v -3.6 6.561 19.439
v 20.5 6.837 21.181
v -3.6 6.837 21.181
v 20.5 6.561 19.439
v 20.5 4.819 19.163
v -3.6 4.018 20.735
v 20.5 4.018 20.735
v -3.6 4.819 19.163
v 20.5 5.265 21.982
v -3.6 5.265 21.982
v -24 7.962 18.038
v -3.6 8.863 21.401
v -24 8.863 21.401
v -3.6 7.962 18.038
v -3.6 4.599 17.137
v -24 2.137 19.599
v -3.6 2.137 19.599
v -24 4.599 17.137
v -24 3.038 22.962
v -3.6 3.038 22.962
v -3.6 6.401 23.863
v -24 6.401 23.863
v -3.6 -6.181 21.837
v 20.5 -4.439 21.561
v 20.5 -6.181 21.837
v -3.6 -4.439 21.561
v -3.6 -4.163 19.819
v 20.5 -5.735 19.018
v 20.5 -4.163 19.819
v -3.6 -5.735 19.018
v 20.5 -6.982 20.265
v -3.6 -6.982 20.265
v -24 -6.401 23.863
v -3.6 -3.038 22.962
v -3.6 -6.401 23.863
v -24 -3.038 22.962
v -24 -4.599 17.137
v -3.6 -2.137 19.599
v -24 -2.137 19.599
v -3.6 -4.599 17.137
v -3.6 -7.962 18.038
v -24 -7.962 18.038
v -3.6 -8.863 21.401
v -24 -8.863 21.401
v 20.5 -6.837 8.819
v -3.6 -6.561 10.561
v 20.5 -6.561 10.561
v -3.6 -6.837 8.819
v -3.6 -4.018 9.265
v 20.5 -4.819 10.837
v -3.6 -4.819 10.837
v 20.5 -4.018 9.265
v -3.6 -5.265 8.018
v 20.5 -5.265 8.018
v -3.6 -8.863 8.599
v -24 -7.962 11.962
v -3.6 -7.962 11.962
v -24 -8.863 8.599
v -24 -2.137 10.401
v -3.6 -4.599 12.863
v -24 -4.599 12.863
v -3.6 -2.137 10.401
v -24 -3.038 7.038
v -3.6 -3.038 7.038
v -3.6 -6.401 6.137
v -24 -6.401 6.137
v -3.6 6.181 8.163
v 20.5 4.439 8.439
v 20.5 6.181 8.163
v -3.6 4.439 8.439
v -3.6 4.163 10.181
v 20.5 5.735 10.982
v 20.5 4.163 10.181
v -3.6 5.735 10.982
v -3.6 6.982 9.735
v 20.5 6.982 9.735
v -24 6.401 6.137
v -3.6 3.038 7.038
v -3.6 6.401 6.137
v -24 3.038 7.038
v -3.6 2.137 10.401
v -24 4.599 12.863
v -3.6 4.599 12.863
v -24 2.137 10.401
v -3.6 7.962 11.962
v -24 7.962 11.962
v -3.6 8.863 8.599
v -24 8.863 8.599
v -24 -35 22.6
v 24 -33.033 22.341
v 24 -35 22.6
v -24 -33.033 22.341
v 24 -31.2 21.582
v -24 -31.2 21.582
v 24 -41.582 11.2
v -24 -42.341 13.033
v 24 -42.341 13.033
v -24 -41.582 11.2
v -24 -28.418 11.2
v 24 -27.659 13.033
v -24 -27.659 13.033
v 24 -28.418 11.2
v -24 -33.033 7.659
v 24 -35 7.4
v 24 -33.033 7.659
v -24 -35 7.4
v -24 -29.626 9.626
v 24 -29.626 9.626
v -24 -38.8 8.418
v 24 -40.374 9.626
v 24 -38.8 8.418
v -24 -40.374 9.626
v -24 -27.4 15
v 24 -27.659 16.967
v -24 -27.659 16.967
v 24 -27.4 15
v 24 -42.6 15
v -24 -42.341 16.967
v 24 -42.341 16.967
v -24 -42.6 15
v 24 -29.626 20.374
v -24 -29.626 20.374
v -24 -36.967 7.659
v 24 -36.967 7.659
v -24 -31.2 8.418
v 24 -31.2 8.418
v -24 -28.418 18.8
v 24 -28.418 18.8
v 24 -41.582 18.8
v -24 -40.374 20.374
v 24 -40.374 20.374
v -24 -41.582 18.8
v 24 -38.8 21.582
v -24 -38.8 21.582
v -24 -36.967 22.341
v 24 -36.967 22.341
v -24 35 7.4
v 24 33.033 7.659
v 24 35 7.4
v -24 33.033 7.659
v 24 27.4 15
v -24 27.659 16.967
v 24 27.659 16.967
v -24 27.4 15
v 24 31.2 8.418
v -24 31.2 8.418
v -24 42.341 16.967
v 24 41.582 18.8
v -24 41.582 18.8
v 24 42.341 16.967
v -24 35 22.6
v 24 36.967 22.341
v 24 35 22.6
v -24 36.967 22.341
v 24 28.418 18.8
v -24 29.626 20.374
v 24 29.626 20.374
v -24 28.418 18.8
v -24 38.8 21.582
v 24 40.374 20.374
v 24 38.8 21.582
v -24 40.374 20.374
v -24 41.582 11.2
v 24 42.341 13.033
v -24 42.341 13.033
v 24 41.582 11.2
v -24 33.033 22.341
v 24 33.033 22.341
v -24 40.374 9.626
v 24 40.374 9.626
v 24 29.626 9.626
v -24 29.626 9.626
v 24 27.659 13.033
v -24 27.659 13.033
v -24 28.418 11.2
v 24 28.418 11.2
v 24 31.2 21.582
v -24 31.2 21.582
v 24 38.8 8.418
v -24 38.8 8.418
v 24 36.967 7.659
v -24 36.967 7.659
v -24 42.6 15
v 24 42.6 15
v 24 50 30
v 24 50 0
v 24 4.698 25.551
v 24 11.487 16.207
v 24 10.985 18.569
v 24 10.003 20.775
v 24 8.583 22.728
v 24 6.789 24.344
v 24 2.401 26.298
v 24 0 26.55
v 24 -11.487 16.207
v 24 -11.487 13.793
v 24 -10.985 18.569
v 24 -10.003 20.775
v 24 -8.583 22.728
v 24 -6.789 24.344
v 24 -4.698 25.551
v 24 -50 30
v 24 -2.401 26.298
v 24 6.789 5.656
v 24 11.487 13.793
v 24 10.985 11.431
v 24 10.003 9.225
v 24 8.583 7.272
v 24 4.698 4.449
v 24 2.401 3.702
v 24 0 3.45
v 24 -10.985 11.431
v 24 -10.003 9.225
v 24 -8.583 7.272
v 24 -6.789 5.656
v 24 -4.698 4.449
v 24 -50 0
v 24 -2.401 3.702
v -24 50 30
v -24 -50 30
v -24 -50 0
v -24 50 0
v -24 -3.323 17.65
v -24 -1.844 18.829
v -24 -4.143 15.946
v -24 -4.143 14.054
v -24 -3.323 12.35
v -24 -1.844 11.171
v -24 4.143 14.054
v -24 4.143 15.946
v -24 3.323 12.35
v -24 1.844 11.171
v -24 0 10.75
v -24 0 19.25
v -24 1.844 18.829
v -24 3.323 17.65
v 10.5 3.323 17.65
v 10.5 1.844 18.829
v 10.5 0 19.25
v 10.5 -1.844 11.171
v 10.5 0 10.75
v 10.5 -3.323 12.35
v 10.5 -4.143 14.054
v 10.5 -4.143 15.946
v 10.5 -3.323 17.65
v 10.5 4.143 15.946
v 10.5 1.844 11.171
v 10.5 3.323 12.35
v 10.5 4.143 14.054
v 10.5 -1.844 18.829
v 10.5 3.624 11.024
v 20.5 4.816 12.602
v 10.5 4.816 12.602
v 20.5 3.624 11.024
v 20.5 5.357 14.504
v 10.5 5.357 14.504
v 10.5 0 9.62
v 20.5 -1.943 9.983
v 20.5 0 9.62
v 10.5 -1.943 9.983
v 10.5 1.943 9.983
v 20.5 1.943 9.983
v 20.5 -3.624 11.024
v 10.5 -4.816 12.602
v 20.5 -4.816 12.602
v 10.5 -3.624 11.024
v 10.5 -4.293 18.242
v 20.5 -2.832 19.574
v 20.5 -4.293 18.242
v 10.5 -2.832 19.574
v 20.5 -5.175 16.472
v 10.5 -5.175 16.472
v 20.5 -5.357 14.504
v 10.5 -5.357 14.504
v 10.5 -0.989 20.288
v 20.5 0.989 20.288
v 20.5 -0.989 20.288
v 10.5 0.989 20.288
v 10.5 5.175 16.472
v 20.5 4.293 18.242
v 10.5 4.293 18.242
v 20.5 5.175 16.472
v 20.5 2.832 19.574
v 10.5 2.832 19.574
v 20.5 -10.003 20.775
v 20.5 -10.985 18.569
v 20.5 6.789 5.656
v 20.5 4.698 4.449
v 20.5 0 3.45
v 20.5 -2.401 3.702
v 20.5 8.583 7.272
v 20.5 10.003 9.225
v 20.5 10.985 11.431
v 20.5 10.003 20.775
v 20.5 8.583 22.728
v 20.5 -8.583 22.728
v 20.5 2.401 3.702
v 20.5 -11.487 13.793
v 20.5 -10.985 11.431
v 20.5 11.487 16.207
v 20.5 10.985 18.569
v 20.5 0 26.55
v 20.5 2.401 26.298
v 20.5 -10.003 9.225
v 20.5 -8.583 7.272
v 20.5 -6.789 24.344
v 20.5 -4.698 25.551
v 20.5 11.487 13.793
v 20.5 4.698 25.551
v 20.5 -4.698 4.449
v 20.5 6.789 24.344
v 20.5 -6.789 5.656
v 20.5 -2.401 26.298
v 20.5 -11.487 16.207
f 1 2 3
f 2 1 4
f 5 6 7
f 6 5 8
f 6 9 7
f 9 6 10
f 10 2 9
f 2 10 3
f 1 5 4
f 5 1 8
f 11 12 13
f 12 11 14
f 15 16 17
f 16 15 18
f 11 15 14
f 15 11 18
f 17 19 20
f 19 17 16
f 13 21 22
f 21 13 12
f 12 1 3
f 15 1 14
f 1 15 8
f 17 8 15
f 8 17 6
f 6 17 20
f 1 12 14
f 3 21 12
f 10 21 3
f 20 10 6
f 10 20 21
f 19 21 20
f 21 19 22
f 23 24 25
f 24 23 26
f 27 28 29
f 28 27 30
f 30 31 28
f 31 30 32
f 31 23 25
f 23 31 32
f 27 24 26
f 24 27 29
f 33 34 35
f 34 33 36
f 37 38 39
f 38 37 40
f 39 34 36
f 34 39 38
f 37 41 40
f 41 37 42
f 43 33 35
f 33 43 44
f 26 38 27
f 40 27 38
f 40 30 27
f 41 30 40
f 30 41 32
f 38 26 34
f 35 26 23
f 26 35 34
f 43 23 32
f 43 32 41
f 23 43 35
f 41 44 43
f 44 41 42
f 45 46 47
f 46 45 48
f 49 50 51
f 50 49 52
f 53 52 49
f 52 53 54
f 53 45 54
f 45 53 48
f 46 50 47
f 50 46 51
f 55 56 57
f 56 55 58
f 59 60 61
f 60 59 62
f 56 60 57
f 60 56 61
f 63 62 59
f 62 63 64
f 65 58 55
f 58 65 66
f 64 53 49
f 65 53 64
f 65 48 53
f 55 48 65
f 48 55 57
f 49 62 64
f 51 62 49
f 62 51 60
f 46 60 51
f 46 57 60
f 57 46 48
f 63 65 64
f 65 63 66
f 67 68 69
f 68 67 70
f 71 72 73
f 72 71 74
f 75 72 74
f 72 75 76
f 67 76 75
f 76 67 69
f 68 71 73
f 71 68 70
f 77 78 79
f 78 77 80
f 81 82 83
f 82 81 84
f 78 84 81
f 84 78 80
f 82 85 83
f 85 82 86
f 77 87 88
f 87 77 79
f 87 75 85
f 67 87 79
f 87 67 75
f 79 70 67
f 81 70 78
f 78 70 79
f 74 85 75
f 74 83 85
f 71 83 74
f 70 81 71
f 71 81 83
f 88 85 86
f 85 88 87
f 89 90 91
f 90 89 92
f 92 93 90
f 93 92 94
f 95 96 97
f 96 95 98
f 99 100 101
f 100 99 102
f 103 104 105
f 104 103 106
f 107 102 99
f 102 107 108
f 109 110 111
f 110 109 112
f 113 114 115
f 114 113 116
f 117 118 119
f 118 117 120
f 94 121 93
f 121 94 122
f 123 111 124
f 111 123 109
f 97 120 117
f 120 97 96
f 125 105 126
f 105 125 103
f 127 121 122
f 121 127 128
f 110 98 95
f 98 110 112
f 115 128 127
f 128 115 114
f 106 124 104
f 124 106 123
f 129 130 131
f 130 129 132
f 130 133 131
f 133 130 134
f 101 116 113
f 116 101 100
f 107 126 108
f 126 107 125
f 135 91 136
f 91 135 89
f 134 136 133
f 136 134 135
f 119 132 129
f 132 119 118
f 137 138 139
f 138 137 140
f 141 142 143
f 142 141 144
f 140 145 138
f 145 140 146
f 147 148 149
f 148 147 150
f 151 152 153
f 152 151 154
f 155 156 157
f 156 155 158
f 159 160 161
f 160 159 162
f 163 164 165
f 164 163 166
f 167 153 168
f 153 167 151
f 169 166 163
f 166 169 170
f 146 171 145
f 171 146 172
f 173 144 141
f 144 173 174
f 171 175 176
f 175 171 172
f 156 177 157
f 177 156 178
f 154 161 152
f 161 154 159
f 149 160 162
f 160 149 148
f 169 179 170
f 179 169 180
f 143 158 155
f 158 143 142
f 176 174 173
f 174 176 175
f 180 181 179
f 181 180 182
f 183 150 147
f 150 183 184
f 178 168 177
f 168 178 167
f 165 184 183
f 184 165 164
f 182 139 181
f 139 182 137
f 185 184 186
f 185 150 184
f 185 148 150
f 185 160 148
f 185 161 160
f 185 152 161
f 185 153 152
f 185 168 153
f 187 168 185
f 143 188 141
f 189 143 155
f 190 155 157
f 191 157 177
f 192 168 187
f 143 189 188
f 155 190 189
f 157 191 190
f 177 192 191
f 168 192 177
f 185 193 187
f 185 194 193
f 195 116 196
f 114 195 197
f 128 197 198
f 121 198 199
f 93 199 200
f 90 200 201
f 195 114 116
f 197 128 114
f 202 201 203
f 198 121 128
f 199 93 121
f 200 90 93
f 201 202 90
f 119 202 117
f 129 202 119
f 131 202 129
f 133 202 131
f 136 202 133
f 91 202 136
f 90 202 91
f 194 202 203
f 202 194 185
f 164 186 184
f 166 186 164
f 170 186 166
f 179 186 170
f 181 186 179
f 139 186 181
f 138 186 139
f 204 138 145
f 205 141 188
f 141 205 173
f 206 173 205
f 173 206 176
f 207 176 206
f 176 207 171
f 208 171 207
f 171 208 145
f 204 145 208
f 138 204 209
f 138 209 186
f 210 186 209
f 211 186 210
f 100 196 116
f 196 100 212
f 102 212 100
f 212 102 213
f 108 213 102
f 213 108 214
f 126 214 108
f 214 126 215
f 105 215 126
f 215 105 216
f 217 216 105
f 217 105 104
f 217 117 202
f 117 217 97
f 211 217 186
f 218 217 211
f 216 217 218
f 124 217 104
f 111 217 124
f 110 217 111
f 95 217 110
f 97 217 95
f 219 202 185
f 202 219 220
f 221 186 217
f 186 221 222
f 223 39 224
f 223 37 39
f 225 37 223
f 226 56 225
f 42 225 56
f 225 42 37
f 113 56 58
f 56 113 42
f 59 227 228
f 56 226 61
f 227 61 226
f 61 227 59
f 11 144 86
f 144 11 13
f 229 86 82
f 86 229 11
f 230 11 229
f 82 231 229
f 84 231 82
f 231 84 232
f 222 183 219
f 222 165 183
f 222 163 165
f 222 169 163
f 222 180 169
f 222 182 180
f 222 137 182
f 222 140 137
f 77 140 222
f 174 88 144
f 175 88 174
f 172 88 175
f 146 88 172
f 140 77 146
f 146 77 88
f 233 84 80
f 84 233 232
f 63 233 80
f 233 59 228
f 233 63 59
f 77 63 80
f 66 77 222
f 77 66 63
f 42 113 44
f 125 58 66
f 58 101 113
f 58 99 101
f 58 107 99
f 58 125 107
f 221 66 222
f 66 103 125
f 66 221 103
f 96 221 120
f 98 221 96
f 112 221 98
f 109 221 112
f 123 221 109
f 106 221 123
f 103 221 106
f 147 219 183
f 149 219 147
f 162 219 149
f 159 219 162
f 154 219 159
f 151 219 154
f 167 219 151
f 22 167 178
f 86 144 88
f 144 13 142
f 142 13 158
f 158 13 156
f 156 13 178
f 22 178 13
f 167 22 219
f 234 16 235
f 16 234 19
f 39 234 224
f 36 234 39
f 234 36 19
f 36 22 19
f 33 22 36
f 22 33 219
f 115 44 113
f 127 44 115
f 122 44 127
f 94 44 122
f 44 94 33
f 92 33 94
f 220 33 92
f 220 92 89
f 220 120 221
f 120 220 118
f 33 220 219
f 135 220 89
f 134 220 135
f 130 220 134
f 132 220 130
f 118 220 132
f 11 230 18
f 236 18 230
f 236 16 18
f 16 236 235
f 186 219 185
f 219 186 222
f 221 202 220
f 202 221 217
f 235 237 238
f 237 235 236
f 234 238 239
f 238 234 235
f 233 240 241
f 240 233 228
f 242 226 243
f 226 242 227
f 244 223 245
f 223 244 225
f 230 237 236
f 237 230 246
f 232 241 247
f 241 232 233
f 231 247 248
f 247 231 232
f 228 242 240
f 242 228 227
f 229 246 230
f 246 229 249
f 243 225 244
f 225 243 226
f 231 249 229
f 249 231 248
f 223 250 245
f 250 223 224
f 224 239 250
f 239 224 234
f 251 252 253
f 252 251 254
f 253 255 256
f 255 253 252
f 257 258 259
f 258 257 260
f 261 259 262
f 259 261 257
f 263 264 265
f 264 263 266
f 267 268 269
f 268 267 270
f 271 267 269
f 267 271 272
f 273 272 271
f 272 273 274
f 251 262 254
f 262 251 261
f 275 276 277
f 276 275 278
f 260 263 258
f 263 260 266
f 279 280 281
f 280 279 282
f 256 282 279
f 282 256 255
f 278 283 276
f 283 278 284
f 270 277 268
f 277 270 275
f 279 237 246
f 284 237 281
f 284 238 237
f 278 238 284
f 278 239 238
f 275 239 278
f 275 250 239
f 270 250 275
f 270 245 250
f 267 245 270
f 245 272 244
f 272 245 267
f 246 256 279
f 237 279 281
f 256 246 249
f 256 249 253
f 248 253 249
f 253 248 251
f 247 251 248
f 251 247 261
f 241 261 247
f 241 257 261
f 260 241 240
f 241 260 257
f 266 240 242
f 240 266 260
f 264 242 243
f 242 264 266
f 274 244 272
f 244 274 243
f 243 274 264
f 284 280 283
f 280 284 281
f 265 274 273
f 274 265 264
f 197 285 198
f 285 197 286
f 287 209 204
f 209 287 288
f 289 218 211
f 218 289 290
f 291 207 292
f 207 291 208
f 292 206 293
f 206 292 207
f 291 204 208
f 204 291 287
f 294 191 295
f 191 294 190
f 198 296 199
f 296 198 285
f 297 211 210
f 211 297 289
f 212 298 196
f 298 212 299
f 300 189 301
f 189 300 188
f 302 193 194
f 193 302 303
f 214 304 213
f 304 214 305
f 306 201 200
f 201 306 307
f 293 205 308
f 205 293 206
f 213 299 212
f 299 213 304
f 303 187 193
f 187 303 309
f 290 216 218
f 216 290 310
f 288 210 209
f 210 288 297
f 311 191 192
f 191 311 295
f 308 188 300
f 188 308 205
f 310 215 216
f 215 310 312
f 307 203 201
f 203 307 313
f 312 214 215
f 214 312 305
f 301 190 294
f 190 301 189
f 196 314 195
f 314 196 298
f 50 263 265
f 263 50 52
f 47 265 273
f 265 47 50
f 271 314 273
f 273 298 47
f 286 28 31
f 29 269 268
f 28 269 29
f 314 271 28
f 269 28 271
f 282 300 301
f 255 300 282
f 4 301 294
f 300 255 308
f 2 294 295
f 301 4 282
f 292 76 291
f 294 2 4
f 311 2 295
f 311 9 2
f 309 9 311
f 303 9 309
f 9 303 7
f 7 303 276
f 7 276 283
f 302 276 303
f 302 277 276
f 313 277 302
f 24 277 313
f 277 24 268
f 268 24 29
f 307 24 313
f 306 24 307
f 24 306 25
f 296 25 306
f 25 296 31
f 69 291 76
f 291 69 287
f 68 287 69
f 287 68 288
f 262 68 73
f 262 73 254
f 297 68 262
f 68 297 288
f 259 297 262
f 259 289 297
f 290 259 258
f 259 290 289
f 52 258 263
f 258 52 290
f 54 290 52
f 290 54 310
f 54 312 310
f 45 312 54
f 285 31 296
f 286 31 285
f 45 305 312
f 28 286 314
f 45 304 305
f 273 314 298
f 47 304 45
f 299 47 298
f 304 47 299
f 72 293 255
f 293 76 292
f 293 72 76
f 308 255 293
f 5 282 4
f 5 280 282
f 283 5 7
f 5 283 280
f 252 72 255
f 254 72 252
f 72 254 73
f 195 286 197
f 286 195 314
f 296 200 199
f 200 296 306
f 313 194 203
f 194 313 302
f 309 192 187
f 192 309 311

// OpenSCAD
M=1000;
epsilon = 0.01;

smooth_rod_diameter = 8;
threaded_rod_diameter = 8;
threaded_rod_tolerance = 0.25;

linear_bearing_diameter = 15.2;
linear_bearing_length = 23.8;

threaded_bearing_length = 13.5;
threaded_bearing_diameter = 10.16 + 0.6;
threaded_bearing_mount_diameter = 22.5 + 0.6;
threaded_bearing_mount_countersink = 3.5;
threaded_bearing_bolt_spacing = 11;

threaded_bearing_bolt_size = 3;
threaded_bearing_bolt_length = 30;
threaded_bearing_nut_size = 6.03;
threaded_bearing_nut_thickness = 2.4;

rod_spacing = 35;
base_height = 30;
base_width = 48;
base_depth = 100;

flange_bearing_max_diameter = 27.0;
flange_bearing_max_width = 47.5;
flange_bearing_thickness = 4.05;
flange_bearing_bolt_diameter = 5;
flange_bearing_bolt_offset = 3.0;
flange_bearing_min_diameter = flange_bearing_bolt_diameter + 2*flange_bearing_bolt_offset;

module flange_bearing() {
    
    hull() {
        
        circle(d=flange_bearing_max_diameter);
        
        mirror_x()
            translate([-flange_bearing_max_width/2+flange_bearing_min_diameter/2,0,0])
            circle(d=flange_bearing_min_diameter);
        
    }
}

module mirror_x() {
    children();
    scale([-1,1,1]) children();
}

module mirror_y() {
    children();
    scale([1,-1,1]) children();
}

module screw_hole(Diameter, Length, NutSize, NutThickness, NutDepth, SlotLength) {
    scale([1,1,-1])
        cylinder(d=Diameter, h=Length, center=false);
    
    translate([0,0,-NutDepth])
        rotate([180,0,0])
        linear_extrude(center=SlotLength>0, height=NutThickness)
        if(SlotLength == 0){
            polygon([
                [NutSize/2*tan(30),NutSize/2],
                [-NutSize/2*tan(30),NutSize/2],
                [-NutSize/2/cos(30),0],
                [-NutSize/2*tan(30),-NutSize/2],
                [NutSize/2*tan(30),-NutSize/2],
                [NutSize/2/cos(30),0]
            ]);
        } else {
            polygon([
                [SlotLength,NutSize/2],
                [-NutSize/2*tan(30),NutSize/2],
                [-NutSize/2/cos(30),0],
                [-NutSize/2*tan(30),-NutSize/2],
                [SlotLength,-NutSize/2]
                //[NutSize/2/cos(30),0],
            ]);
        }
    
}


//
//The base
//

/*$fa = 1;
$fs = 0.2;

flange_bearing();*/

translate([0,0,base_height/2]) 
difference() {
    cube([base_width, base_depth, base_height], center=true);
    
    //The hole for the threaded rod
    rotate([0,90,0]) 
        cylinder(h=M, d=threaded_rod_diameter+2*threaded_rod_tolerance, center=true);
    
    //the threaded rod mount
    translate([base_width/2-threaded_bearing_length,0,0])
    rotate([0,90,0])
        cylinder(h=M, d=threaded_bearing_diameter);
    
    //the threaded rod mount countersink
    translate([base_width/2-threaded_bearing_mount_countersink,0,0])
        rotate([0,90,0])
        cylinder(h=M, d=threaded_bearing_mount_diameter);
    
    //the mounting screw-holes
    translate([base_width/2,0,0])for(i=[0:3]) {
        rotate([90*i,0,0])
        rotate([45,0,0])
        translate([0,threaded_bearing_bolt_spacing/sqrt(2),0])
            rotate([0,90,0])
            rotate([0,0,0])
            screw_hole(
                threaded_bearing_bolt_size, 
                threaded_bearing_bolt_length,
                threaded_bearing_nut_size,
                M,
                threaded_bearing_bolt_length-threaded_bearing_nut_thickness,
                0
                //threaded_bearing_mount_diameter/2
            );
    }
    
    //the holes for the linear bearings
    mirror_y()
        translate([0,-rod_spacing]) 
        rotate([0,90,0]) 
        cylinder(h=M, d=linear_bearing_diameter, center=true);
    
}
